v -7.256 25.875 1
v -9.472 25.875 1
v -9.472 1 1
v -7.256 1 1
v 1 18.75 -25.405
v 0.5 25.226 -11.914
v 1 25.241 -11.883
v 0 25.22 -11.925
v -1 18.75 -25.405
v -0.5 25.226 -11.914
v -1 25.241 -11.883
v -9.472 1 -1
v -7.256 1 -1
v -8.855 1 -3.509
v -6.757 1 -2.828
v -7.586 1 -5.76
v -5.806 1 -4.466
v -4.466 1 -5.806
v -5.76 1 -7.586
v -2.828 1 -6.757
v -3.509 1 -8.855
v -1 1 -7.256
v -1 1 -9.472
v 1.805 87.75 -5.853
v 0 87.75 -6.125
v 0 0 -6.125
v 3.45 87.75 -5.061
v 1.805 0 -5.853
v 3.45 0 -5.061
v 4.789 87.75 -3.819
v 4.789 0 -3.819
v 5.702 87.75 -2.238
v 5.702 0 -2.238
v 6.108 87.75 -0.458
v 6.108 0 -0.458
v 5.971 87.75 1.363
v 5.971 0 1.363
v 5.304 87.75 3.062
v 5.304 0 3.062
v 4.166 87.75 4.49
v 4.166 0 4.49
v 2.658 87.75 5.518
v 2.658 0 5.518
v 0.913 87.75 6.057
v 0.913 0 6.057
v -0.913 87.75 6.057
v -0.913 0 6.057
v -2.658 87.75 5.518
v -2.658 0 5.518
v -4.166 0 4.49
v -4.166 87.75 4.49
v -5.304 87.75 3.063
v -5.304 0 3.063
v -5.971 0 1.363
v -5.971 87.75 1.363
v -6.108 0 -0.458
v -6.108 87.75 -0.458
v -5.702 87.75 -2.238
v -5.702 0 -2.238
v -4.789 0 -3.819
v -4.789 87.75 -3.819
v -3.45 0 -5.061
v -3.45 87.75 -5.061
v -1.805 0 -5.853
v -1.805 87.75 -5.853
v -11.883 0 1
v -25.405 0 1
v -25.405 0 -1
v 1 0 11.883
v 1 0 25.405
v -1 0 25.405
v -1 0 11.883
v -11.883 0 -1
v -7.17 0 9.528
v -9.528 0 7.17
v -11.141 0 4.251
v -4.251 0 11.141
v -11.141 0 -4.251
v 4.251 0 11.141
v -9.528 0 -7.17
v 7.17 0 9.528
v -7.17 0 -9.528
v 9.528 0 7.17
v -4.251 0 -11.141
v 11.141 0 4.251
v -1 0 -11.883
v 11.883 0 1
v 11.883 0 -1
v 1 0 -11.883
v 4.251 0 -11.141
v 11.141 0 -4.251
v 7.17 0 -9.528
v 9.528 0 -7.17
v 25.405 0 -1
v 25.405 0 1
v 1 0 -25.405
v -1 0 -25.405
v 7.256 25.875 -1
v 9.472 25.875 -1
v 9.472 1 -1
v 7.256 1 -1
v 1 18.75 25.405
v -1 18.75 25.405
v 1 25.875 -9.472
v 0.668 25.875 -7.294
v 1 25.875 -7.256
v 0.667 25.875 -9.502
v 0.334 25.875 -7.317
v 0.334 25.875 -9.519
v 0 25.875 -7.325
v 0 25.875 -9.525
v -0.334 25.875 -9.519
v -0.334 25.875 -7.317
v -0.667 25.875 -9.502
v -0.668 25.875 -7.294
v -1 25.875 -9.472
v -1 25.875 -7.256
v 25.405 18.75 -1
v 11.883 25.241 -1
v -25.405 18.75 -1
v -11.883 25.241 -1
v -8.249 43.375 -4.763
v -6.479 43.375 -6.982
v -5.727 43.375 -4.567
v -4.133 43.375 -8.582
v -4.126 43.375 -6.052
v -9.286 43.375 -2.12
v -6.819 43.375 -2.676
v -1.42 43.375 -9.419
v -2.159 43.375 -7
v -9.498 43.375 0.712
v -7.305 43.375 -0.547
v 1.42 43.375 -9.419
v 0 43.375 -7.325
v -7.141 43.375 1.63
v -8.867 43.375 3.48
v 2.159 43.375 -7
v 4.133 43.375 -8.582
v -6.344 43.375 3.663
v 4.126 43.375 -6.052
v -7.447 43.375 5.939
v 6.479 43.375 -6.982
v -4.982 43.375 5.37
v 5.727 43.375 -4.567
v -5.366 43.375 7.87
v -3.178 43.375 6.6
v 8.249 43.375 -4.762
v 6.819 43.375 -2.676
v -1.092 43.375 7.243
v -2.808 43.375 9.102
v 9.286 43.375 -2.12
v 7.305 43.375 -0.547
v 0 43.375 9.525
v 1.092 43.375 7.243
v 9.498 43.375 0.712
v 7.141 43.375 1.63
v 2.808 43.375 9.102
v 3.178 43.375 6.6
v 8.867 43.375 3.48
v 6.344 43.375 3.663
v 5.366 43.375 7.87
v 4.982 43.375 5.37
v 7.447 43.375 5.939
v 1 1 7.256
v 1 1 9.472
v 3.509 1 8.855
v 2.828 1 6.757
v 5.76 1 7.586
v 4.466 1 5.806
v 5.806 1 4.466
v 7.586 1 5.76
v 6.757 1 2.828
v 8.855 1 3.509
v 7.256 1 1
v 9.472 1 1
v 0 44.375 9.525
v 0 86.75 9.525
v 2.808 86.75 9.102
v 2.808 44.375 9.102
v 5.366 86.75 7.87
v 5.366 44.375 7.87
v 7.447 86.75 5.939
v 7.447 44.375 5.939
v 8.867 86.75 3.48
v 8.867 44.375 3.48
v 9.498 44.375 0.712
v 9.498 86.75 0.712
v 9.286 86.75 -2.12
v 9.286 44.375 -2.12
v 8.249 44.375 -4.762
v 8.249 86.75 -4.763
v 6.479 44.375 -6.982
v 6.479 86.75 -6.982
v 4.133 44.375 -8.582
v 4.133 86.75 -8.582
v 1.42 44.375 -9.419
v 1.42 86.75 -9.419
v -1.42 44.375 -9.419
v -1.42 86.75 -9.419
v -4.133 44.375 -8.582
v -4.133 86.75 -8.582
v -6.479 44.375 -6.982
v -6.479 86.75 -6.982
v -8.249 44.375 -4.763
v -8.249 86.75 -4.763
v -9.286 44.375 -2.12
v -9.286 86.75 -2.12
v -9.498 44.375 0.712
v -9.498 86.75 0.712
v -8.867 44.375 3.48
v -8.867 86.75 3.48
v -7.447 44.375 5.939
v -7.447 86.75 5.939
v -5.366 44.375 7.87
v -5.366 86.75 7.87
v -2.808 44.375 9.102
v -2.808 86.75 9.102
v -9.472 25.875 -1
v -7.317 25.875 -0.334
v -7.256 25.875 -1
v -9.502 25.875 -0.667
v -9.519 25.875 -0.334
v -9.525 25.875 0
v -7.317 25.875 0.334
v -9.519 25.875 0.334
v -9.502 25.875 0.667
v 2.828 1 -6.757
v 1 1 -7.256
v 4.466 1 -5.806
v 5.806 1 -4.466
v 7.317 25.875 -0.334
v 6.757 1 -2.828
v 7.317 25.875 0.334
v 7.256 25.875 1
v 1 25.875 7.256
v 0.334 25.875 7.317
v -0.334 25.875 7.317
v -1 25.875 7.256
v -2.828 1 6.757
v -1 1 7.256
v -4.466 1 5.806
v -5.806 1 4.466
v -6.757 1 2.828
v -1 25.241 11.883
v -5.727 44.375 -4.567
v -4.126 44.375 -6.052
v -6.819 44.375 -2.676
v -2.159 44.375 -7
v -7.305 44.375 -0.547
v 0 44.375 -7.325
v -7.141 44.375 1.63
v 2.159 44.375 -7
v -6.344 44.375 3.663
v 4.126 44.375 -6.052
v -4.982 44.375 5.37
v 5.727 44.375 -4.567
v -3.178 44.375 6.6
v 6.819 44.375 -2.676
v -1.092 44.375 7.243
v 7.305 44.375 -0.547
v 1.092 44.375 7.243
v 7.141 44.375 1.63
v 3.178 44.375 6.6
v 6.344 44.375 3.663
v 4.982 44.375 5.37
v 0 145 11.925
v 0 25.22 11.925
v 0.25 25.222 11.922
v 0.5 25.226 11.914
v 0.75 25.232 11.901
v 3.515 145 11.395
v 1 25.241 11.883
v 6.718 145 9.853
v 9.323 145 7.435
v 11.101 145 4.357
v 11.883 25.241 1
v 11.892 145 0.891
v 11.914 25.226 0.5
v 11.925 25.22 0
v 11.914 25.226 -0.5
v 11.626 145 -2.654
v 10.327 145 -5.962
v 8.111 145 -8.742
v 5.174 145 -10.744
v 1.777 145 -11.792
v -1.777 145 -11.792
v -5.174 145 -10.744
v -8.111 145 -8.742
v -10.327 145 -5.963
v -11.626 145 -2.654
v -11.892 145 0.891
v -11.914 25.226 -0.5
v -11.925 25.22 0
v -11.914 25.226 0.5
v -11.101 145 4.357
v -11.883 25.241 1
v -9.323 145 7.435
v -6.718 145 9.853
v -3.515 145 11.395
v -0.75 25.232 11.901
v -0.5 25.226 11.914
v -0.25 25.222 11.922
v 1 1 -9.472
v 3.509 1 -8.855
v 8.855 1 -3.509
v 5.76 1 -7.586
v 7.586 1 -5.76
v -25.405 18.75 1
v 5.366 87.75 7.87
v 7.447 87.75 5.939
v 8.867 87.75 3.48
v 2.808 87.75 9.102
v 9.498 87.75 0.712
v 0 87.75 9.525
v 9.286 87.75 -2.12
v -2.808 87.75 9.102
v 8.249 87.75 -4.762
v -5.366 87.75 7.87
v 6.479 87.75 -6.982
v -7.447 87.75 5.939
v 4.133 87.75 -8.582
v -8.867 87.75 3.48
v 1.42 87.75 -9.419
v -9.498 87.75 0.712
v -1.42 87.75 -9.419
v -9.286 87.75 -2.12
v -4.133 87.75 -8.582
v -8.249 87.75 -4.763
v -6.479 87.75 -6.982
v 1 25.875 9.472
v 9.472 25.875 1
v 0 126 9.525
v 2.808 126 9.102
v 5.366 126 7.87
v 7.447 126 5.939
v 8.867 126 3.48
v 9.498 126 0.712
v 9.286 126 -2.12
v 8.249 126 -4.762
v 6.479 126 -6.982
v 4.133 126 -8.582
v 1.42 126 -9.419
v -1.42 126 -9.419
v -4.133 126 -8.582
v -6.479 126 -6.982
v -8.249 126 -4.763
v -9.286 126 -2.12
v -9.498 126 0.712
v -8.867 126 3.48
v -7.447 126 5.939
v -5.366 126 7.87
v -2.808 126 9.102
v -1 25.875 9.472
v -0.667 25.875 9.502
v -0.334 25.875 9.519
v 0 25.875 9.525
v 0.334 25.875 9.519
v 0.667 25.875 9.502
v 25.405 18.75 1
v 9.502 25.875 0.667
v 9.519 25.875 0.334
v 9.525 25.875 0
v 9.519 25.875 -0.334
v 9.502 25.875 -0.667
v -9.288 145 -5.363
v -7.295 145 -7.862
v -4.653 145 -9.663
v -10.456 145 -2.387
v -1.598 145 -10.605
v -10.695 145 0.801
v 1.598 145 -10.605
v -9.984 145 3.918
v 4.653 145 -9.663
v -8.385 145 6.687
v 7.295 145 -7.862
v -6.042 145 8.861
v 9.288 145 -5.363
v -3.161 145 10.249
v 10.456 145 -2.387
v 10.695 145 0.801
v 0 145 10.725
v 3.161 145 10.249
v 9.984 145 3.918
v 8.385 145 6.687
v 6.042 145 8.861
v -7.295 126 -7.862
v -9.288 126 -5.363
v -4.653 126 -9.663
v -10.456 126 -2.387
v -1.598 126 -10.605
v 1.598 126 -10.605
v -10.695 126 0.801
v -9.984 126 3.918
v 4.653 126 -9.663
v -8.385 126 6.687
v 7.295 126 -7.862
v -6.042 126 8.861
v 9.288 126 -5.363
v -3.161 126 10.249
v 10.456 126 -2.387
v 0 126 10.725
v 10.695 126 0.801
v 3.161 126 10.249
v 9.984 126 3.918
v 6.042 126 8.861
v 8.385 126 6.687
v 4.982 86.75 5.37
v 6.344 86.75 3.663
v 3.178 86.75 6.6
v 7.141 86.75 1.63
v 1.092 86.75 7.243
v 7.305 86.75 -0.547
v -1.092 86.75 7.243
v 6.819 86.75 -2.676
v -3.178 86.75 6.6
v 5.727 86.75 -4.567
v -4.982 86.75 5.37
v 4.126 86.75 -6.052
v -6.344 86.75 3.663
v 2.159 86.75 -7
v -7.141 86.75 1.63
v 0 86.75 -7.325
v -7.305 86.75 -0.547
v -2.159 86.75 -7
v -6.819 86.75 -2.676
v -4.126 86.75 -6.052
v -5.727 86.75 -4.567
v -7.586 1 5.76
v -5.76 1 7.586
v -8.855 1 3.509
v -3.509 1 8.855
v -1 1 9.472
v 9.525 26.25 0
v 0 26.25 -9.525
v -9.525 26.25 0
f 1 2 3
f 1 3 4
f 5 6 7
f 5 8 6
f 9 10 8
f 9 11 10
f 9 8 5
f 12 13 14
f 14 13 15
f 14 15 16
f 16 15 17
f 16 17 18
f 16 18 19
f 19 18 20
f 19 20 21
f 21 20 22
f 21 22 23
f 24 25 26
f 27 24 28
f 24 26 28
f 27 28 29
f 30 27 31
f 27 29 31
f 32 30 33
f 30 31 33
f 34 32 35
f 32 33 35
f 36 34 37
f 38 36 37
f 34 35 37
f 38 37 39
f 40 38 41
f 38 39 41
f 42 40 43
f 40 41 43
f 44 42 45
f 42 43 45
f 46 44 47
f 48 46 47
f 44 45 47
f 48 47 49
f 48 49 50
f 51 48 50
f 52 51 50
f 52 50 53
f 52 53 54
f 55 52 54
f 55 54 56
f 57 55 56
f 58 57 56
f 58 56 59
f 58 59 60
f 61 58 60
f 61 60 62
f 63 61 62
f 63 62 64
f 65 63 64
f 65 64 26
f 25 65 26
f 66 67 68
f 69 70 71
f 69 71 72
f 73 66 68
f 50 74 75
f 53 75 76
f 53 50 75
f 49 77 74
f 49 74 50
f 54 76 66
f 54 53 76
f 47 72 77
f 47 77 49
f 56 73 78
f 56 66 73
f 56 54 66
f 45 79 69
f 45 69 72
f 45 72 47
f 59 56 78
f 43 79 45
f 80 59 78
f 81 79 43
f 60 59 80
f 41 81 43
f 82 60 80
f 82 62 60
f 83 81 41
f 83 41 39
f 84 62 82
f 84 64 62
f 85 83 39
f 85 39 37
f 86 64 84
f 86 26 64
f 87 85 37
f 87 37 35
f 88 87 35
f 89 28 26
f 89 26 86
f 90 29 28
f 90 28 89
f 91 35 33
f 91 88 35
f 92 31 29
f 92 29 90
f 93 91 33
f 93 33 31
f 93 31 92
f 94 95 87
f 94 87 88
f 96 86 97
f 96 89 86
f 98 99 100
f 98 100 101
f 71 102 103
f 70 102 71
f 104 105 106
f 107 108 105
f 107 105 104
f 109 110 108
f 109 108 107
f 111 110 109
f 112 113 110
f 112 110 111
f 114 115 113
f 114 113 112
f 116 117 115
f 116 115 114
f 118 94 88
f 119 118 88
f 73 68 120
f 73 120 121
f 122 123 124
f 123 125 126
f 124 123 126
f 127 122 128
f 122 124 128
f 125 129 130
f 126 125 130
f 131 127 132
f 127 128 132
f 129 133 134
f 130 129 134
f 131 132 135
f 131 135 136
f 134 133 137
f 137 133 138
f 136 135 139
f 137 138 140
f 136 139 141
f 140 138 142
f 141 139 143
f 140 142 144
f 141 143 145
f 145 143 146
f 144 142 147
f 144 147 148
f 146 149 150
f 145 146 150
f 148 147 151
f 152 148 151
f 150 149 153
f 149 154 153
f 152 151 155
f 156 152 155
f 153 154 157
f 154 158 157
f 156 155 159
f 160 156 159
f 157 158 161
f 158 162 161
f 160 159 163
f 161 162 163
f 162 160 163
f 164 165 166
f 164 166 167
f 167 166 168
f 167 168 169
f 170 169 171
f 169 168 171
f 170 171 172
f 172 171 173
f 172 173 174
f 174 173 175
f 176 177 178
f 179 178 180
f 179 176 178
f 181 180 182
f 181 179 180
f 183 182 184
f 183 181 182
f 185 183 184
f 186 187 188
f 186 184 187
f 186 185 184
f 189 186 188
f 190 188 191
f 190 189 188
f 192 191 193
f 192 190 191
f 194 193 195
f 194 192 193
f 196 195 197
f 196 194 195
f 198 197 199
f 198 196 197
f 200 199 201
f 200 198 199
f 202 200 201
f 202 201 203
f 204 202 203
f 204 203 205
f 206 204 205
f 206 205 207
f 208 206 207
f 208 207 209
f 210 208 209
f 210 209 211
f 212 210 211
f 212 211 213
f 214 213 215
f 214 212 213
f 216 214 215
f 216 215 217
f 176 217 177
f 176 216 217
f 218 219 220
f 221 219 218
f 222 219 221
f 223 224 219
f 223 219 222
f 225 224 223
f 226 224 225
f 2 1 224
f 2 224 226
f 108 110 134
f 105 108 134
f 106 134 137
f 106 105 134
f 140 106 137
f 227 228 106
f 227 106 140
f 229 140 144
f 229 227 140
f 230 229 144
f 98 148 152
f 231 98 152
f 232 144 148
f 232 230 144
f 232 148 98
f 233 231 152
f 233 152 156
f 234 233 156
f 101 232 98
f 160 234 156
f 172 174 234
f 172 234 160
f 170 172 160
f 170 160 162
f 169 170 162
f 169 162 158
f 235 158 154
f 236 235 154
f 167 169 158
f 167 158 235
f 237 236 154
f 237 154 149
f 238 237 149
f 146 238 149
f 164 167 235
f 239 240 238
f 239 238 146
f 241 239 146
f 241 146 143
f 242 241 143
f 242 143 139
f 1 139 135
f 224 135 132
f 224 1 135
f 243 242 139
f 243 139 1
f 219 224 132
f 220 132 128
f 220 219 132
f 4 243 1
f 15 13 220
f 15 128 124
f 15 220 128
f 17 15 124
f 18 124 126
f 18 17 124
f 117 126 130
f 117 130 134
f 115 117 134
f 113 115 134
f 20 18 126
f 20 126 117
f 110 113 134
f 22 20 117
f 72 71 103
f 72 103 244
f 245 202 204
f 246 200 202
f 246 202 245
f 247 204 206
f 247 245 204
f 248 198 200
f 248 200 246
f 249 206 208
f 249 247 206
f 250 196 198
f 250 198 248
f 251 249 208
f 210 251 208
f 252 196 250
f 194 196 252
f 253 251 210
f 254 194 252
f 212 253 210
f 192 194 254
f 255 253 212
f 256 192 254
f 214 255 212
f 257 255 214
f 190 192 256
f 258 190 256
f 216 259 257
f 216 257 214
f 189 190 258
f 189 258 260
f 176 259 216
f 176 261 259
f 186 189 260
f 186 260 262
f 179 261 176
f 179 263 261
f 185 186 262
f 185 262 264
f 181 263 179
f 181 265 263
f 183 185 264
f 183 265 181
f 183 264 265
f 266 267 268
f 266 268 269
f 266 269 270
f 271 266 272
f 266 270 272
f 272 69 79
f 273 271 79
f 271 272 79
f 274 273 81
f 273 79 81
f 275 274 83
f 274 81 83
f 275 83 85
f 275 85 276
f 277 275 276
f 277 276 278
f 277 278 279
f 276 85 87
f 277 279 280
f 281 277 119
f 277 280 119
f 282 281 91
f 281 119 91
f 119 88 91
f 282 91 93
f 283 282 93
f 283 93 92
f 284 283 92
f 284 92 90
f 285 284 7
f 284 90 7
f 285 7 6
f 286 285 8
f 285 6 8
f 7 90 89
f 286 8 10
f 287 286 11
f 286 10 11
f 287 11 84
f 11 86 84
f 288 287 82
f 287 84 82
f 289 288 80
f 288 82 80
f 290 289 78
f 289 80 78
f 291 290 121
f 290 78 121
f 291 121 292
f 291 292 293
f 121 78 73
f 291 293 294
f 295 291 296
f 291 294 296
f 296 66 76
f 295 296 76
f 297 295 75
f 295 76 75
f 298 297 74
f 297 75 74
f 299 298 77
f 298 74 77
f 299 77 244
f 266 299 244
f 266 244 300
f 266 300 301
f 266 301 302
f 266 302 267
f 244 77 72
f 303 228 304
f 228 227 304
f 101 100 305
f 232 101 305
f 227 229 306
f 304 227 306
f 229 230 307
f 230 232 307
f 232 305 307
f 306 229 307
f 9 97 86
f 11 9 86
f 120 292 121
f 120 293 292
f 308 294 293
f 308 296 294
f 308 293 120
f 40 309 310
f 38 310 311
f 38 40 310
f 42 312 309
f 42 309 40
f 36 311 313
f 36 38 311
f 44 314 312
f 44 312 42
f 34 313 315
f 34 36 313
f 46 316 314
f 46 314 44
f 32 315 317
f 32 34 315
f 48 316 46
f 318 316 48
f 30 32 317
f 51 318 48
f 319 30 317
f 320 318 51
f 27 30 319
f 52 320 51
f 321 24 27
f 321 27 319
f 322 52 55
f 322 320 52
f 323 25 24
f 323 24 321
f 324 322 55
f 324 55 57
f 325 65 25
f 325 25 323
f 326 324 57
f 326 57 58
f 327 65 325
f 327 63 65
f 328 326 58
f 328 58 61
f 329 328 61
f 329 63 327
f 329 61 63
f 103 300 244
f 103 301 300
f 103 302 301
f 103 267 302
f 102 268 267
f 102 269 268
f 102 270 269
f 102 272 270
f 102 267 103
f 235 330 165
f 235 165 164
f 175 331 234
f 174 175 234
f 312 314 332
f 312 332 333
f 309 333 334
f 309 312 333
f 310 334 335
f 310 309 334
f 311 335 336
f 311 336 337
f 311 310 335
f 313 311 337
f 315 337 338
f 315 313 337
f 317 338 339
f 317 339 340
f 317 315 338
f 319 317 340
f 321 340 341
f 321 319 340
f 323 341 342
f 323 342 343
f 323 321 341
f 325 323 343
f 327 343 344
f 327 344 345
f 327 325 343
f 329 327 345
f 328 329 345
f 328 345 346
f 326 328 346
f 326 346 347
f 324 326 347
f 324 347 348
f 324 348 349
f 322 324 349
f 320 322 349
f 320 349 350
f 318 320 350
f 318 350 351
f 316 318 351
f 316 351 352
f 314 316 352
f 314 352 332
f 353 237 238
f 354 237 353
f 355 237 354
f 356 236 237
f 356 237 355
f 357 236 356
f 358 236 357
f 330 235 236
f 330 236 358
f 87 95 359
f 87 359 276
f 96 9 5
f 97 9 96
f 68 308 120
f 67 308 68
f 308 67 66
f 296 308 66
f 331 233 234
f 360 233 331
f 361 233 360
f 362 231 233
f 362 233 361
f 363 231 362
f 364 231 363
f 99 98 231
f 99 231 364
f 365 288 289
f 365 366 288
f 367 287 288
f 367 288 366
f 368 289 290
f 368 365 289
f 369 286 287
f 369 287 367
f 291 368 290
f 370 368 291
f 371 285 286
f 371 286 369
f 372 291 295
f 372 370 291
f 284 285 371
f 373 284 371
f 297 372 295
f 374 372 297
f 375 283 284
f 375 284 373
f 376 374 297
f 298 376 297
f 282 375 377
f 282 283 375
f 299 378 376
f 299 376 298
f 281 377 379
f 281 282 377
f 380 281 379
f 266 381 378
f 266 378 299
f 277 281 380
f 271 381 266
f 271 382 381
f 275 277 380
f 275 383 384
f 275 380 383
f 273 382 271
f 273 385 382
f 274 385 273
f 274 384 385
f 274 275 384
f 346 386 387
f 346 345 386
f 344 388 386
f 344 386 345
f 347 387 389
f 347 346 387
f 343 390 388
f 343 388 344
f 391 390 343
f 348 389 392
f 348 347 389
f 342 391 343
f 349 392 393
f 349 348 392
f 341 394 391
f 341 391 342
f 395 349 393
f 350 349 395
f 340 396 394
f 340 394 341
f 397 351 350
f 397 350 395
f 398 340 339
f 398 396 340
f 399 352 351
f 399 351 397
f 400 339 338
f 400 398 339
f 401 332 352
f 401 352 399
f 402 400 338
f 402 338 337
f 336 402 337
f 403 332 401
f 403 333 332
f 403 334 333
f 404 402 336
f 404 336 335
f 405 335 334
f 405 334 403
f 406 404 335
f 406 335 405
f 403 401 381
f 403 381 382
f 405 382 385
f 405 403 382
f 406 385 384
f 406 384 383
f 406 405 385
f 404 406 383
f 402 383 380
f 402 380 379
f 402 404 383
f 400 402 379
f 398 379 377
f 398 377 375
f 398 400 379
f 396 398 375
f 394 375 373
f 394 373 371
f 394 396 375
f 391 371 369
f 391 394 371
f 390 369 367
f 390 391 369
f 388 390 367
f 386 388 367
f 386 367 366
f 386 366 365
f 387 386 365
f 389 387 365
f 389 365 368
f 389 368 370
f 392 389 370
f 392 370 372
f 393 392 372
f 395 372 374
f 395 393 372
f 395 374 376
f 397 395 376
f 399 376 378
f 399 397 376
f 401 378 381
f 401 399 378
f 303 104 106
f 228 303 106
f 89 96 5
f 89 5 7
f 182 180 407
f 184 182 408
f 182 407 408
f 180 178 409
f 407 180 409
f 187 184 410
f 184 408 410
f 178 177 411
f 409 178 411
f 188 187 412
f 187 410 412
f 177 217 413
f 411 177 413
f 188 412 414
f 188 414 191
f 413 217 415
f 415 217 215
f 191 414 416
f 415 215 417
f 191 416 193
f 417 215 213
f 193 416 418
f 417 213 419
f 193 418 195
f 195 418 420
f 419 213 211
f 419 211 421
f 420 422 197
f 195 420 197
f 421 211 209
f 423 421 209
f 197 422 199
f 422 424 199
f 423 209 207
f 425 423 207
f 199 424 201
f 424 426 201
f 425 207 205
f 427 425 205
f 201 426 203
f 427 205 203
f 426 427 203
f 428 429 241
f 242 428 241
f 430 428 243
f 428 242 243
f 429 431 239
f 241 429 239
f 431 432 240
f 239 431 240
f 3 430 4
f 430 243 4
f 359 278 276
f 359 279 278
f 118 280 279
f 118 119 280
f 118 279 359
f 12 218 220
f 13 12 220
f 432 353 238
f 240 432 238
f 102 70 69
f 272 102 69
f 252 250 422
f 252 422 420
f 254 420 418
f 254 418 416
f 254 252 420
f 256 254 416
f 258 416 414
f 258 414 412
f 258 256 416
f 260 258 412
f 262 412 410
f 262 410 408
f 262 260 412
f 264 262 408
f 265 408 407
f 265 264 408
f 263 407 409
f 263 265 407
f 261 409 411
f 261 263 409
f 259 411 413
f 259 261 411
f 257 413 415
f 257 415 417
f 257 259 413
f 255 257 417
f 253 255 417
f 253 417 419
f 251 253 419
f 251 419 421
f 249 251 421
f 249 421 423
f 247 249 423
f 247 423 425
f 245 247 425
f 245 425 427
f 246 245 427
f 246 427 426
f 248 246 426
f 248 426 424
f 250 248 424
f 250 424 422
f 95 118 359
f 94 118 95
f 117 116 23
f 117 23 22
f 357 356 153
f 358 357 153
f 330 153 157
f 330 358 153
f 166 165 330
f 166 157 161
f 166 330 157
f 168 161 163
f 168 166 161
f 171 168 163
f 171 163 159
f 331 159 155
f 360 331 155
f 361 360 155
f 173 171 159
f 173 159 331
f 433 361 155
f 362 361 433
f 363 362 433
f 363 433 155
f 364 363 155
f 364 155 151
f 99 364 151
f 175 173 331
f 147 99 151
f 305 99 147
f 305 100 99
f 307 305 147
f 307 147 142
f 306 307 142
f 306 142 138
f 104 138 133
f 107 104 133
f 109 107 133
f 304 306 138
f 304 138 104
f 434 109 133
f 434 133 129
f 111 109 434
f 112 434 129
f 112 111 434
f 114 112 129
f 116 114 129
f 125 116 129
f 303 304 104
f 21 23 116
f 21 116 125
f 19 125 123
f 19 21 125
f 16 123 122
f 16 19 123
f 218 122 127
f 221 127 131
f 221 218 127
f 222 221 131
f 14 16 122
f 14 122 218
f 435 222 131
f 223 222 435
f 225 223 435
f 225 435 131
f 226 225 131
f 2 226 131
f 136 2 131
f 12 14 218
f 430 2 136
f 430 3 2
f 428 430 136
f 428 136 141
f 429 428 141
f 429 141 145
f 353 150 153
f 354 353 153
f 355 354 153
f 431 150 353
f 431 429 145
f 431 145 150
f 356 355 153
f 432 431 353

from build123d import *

# Parameters (mm, degrees)
SKETCH1_R                = 11.925
SKETCH1_R_2              = 9.525
BOSS_EXTRUDE1_DEPTH      = 145
BOSS_EXTRUDE2_DEPTH      = 1
CIRPATTERN1_COUNT        = 4
SKETCH3_R                = 7.325
SKETCH3_R_2              = 6.125
BOSS_EXTRUDE3_DEPTH      = 87.75
CUT_EXTRUDE1_START       = -19
SKETCH4_R                = 10.725
SKETCH4_R_2              = 9.525
CUT_EXTRUDE1_DEPTH       = 19
BOSS_EXTRUDE4_START      = -1
SKETCH5_R                = 9.525
SKETCH5_R_2              = 6.125
BOSS_EXTRUDE4_DEPTH      = 1
BOSS_EXTRUDE5_DEPTH      = 0.5
BOSS_EXTRUDE5_DEPTH_BACK = 0.5
SKETCH6_R                = 9.525
SKETCH6_R_2              = 6.125
SKETCH7_R                = 9.525
SKETCH7_R_2              = 6.125
BOSS_EXTRUDE6_DEPTH      = 1


with BuildPart() as part:
    # Sketch1 → Boss-Extrude1 (new body)
    with BuildSketch(Plane(origin=(0, 0, 0), x_dir=(1, 0, 0), z_dir=(0, 1, 0))):
        with Locations(Location((0, 0, 0), (0, 0, 270))):
            Circle(SKETCH1_R)
        with Locations(Location((0, 0, 0), (0, 0, 270))):
            Circle(SKETCH1_R_2, mode=Mode.SUBTRACT)
    extrude(amount=BOSS_EXTRUDE1_DEPTH)

    # Sketch2 → Boss-Extrude2 (add, symmetric)
    with BuildSketch(Plane.XY):
        Polygon((-9.525, 0), (-9.525, 0.375), (-6.397493745, 0.375), (-6.397493745, 25.875), (-9.525, 25.875), (-9.525, 26.25), (-9.780127693, 26.25), (-25.405127693, 18.75), (-25.405127693, 0), align=None)
    boss_extrude2 = extrude(amount=BOSS_EXTRUDE2_DEPTH, both=True)

    # CirPattern1: Boss-Extrude2 ×4 about axis
    cirpattern1_axis = Axis((0, 0, 0), (0, 1, 0))
    for i in range(1, CIRPATTERN1_COUNT):
        add(boss_extrude2.rotate(cirpattern1_axis, i * 360 / CIRPATTERN1_COUNT))

    # Sketch4 → Cut-Extrude1 (cut)
    with BuildSketch(Plane(origin=(0, 145, 0), x_dir=(1, 0, 0), z_dir=(0, 1, 0)).offset(CUT_EXTRUDE1_START)):
        with Locations(Location((0, 0, 0), (0, 0, 270))):
            Circle(SKETCH4_R)
        with Locations(Location((0, 0, 0), (0, 0, 270))):
            Circle(SKETCH4_R_2, mode=Mode.SUBTRACT)
    extrude(amount=CUT_EXTRUDE1_DEPTH, mode=Mode.SUBTRACT)



with BuildPart() as body_2:
    # Sketch3 → Boss-Extrude3 (new body)
    with BuildSketch(Plane.XZ):
        with Locations(Location((0, 0, 0), (0, 0, 270))):
            Circle(SKETCH3_R)
        with Locations(Location((0, 0, 0), (0, 0, 270))):
            Circle(SKETCH3_R_2, mode=Mode.SUBTRACT)
    extrude(amount=-BOSS_EXTRUDE3_DEPTH)


with BuildPart() as part_1:
    add(part.part)

    add(body_2.part)  # Boss-Extrude4 merges body 2
    # Sketch5 → Boss-Extrude4 (add)
    with BuildSketch(Plane(origin=(0, 87.75, 0), x_dir=(1, 0, 0), z_dir=(0, 1, 0)).offset(BOSS_EXTRUDE4_START)):
        with Locations(Location((0, 0, 0), (0, 0, 90))):
            Circle(SKETCH5_R)
        with Locations(Location((0, 0, 0), (0, 0, 90))):
            Circle(SKETCH5_R_2, mode=Mode.SUBTRACT)
    extrude(amount=BOSS_EXTRUDE4_DEPTH)

    # Sketch6 → Boss-Extrude5 (add, two sides: drawn at the far end of the back side and taken through both)
    with BuildSketch(Plane(origin=(0, 43.875, 0), x_dir=(1, 0, 0), z_dir=(0, 1, 0)).offset(-BOSS_EXTRUDE5_DEPTH_BACK)):
        with Locations(Location((0, 0, 0), (0, 0, 270))):
            Circle(SKETCH6_R)
        with Locations(Location((0, 0, 0), (0, 0, 90))):
            Circle(SKETCH6_R_2, mode=Mode.SUBTRACT)
    extrude(amount=BOSS_EXTRUDE5_DEPTH + BOSS_EXTRUDE5_DEPTH_BACK)

    # Sketch7 → Boss-Extrude6 (add)
    with BuildSketch(Plane.XZ):
        with Locations(Location((0, 0, 0), (0, 0, 270))):
            Circle(SKETCH7_R)
        with Locations(Location((0, 0, 0), (0, 0, 270))):
            Circle(SKETCH7_R_2, mode=Mode.SUBTRACT)
    extrude(amount=-BOSS_EXTRUDE6_DEPTH)


solid = part_1.part
